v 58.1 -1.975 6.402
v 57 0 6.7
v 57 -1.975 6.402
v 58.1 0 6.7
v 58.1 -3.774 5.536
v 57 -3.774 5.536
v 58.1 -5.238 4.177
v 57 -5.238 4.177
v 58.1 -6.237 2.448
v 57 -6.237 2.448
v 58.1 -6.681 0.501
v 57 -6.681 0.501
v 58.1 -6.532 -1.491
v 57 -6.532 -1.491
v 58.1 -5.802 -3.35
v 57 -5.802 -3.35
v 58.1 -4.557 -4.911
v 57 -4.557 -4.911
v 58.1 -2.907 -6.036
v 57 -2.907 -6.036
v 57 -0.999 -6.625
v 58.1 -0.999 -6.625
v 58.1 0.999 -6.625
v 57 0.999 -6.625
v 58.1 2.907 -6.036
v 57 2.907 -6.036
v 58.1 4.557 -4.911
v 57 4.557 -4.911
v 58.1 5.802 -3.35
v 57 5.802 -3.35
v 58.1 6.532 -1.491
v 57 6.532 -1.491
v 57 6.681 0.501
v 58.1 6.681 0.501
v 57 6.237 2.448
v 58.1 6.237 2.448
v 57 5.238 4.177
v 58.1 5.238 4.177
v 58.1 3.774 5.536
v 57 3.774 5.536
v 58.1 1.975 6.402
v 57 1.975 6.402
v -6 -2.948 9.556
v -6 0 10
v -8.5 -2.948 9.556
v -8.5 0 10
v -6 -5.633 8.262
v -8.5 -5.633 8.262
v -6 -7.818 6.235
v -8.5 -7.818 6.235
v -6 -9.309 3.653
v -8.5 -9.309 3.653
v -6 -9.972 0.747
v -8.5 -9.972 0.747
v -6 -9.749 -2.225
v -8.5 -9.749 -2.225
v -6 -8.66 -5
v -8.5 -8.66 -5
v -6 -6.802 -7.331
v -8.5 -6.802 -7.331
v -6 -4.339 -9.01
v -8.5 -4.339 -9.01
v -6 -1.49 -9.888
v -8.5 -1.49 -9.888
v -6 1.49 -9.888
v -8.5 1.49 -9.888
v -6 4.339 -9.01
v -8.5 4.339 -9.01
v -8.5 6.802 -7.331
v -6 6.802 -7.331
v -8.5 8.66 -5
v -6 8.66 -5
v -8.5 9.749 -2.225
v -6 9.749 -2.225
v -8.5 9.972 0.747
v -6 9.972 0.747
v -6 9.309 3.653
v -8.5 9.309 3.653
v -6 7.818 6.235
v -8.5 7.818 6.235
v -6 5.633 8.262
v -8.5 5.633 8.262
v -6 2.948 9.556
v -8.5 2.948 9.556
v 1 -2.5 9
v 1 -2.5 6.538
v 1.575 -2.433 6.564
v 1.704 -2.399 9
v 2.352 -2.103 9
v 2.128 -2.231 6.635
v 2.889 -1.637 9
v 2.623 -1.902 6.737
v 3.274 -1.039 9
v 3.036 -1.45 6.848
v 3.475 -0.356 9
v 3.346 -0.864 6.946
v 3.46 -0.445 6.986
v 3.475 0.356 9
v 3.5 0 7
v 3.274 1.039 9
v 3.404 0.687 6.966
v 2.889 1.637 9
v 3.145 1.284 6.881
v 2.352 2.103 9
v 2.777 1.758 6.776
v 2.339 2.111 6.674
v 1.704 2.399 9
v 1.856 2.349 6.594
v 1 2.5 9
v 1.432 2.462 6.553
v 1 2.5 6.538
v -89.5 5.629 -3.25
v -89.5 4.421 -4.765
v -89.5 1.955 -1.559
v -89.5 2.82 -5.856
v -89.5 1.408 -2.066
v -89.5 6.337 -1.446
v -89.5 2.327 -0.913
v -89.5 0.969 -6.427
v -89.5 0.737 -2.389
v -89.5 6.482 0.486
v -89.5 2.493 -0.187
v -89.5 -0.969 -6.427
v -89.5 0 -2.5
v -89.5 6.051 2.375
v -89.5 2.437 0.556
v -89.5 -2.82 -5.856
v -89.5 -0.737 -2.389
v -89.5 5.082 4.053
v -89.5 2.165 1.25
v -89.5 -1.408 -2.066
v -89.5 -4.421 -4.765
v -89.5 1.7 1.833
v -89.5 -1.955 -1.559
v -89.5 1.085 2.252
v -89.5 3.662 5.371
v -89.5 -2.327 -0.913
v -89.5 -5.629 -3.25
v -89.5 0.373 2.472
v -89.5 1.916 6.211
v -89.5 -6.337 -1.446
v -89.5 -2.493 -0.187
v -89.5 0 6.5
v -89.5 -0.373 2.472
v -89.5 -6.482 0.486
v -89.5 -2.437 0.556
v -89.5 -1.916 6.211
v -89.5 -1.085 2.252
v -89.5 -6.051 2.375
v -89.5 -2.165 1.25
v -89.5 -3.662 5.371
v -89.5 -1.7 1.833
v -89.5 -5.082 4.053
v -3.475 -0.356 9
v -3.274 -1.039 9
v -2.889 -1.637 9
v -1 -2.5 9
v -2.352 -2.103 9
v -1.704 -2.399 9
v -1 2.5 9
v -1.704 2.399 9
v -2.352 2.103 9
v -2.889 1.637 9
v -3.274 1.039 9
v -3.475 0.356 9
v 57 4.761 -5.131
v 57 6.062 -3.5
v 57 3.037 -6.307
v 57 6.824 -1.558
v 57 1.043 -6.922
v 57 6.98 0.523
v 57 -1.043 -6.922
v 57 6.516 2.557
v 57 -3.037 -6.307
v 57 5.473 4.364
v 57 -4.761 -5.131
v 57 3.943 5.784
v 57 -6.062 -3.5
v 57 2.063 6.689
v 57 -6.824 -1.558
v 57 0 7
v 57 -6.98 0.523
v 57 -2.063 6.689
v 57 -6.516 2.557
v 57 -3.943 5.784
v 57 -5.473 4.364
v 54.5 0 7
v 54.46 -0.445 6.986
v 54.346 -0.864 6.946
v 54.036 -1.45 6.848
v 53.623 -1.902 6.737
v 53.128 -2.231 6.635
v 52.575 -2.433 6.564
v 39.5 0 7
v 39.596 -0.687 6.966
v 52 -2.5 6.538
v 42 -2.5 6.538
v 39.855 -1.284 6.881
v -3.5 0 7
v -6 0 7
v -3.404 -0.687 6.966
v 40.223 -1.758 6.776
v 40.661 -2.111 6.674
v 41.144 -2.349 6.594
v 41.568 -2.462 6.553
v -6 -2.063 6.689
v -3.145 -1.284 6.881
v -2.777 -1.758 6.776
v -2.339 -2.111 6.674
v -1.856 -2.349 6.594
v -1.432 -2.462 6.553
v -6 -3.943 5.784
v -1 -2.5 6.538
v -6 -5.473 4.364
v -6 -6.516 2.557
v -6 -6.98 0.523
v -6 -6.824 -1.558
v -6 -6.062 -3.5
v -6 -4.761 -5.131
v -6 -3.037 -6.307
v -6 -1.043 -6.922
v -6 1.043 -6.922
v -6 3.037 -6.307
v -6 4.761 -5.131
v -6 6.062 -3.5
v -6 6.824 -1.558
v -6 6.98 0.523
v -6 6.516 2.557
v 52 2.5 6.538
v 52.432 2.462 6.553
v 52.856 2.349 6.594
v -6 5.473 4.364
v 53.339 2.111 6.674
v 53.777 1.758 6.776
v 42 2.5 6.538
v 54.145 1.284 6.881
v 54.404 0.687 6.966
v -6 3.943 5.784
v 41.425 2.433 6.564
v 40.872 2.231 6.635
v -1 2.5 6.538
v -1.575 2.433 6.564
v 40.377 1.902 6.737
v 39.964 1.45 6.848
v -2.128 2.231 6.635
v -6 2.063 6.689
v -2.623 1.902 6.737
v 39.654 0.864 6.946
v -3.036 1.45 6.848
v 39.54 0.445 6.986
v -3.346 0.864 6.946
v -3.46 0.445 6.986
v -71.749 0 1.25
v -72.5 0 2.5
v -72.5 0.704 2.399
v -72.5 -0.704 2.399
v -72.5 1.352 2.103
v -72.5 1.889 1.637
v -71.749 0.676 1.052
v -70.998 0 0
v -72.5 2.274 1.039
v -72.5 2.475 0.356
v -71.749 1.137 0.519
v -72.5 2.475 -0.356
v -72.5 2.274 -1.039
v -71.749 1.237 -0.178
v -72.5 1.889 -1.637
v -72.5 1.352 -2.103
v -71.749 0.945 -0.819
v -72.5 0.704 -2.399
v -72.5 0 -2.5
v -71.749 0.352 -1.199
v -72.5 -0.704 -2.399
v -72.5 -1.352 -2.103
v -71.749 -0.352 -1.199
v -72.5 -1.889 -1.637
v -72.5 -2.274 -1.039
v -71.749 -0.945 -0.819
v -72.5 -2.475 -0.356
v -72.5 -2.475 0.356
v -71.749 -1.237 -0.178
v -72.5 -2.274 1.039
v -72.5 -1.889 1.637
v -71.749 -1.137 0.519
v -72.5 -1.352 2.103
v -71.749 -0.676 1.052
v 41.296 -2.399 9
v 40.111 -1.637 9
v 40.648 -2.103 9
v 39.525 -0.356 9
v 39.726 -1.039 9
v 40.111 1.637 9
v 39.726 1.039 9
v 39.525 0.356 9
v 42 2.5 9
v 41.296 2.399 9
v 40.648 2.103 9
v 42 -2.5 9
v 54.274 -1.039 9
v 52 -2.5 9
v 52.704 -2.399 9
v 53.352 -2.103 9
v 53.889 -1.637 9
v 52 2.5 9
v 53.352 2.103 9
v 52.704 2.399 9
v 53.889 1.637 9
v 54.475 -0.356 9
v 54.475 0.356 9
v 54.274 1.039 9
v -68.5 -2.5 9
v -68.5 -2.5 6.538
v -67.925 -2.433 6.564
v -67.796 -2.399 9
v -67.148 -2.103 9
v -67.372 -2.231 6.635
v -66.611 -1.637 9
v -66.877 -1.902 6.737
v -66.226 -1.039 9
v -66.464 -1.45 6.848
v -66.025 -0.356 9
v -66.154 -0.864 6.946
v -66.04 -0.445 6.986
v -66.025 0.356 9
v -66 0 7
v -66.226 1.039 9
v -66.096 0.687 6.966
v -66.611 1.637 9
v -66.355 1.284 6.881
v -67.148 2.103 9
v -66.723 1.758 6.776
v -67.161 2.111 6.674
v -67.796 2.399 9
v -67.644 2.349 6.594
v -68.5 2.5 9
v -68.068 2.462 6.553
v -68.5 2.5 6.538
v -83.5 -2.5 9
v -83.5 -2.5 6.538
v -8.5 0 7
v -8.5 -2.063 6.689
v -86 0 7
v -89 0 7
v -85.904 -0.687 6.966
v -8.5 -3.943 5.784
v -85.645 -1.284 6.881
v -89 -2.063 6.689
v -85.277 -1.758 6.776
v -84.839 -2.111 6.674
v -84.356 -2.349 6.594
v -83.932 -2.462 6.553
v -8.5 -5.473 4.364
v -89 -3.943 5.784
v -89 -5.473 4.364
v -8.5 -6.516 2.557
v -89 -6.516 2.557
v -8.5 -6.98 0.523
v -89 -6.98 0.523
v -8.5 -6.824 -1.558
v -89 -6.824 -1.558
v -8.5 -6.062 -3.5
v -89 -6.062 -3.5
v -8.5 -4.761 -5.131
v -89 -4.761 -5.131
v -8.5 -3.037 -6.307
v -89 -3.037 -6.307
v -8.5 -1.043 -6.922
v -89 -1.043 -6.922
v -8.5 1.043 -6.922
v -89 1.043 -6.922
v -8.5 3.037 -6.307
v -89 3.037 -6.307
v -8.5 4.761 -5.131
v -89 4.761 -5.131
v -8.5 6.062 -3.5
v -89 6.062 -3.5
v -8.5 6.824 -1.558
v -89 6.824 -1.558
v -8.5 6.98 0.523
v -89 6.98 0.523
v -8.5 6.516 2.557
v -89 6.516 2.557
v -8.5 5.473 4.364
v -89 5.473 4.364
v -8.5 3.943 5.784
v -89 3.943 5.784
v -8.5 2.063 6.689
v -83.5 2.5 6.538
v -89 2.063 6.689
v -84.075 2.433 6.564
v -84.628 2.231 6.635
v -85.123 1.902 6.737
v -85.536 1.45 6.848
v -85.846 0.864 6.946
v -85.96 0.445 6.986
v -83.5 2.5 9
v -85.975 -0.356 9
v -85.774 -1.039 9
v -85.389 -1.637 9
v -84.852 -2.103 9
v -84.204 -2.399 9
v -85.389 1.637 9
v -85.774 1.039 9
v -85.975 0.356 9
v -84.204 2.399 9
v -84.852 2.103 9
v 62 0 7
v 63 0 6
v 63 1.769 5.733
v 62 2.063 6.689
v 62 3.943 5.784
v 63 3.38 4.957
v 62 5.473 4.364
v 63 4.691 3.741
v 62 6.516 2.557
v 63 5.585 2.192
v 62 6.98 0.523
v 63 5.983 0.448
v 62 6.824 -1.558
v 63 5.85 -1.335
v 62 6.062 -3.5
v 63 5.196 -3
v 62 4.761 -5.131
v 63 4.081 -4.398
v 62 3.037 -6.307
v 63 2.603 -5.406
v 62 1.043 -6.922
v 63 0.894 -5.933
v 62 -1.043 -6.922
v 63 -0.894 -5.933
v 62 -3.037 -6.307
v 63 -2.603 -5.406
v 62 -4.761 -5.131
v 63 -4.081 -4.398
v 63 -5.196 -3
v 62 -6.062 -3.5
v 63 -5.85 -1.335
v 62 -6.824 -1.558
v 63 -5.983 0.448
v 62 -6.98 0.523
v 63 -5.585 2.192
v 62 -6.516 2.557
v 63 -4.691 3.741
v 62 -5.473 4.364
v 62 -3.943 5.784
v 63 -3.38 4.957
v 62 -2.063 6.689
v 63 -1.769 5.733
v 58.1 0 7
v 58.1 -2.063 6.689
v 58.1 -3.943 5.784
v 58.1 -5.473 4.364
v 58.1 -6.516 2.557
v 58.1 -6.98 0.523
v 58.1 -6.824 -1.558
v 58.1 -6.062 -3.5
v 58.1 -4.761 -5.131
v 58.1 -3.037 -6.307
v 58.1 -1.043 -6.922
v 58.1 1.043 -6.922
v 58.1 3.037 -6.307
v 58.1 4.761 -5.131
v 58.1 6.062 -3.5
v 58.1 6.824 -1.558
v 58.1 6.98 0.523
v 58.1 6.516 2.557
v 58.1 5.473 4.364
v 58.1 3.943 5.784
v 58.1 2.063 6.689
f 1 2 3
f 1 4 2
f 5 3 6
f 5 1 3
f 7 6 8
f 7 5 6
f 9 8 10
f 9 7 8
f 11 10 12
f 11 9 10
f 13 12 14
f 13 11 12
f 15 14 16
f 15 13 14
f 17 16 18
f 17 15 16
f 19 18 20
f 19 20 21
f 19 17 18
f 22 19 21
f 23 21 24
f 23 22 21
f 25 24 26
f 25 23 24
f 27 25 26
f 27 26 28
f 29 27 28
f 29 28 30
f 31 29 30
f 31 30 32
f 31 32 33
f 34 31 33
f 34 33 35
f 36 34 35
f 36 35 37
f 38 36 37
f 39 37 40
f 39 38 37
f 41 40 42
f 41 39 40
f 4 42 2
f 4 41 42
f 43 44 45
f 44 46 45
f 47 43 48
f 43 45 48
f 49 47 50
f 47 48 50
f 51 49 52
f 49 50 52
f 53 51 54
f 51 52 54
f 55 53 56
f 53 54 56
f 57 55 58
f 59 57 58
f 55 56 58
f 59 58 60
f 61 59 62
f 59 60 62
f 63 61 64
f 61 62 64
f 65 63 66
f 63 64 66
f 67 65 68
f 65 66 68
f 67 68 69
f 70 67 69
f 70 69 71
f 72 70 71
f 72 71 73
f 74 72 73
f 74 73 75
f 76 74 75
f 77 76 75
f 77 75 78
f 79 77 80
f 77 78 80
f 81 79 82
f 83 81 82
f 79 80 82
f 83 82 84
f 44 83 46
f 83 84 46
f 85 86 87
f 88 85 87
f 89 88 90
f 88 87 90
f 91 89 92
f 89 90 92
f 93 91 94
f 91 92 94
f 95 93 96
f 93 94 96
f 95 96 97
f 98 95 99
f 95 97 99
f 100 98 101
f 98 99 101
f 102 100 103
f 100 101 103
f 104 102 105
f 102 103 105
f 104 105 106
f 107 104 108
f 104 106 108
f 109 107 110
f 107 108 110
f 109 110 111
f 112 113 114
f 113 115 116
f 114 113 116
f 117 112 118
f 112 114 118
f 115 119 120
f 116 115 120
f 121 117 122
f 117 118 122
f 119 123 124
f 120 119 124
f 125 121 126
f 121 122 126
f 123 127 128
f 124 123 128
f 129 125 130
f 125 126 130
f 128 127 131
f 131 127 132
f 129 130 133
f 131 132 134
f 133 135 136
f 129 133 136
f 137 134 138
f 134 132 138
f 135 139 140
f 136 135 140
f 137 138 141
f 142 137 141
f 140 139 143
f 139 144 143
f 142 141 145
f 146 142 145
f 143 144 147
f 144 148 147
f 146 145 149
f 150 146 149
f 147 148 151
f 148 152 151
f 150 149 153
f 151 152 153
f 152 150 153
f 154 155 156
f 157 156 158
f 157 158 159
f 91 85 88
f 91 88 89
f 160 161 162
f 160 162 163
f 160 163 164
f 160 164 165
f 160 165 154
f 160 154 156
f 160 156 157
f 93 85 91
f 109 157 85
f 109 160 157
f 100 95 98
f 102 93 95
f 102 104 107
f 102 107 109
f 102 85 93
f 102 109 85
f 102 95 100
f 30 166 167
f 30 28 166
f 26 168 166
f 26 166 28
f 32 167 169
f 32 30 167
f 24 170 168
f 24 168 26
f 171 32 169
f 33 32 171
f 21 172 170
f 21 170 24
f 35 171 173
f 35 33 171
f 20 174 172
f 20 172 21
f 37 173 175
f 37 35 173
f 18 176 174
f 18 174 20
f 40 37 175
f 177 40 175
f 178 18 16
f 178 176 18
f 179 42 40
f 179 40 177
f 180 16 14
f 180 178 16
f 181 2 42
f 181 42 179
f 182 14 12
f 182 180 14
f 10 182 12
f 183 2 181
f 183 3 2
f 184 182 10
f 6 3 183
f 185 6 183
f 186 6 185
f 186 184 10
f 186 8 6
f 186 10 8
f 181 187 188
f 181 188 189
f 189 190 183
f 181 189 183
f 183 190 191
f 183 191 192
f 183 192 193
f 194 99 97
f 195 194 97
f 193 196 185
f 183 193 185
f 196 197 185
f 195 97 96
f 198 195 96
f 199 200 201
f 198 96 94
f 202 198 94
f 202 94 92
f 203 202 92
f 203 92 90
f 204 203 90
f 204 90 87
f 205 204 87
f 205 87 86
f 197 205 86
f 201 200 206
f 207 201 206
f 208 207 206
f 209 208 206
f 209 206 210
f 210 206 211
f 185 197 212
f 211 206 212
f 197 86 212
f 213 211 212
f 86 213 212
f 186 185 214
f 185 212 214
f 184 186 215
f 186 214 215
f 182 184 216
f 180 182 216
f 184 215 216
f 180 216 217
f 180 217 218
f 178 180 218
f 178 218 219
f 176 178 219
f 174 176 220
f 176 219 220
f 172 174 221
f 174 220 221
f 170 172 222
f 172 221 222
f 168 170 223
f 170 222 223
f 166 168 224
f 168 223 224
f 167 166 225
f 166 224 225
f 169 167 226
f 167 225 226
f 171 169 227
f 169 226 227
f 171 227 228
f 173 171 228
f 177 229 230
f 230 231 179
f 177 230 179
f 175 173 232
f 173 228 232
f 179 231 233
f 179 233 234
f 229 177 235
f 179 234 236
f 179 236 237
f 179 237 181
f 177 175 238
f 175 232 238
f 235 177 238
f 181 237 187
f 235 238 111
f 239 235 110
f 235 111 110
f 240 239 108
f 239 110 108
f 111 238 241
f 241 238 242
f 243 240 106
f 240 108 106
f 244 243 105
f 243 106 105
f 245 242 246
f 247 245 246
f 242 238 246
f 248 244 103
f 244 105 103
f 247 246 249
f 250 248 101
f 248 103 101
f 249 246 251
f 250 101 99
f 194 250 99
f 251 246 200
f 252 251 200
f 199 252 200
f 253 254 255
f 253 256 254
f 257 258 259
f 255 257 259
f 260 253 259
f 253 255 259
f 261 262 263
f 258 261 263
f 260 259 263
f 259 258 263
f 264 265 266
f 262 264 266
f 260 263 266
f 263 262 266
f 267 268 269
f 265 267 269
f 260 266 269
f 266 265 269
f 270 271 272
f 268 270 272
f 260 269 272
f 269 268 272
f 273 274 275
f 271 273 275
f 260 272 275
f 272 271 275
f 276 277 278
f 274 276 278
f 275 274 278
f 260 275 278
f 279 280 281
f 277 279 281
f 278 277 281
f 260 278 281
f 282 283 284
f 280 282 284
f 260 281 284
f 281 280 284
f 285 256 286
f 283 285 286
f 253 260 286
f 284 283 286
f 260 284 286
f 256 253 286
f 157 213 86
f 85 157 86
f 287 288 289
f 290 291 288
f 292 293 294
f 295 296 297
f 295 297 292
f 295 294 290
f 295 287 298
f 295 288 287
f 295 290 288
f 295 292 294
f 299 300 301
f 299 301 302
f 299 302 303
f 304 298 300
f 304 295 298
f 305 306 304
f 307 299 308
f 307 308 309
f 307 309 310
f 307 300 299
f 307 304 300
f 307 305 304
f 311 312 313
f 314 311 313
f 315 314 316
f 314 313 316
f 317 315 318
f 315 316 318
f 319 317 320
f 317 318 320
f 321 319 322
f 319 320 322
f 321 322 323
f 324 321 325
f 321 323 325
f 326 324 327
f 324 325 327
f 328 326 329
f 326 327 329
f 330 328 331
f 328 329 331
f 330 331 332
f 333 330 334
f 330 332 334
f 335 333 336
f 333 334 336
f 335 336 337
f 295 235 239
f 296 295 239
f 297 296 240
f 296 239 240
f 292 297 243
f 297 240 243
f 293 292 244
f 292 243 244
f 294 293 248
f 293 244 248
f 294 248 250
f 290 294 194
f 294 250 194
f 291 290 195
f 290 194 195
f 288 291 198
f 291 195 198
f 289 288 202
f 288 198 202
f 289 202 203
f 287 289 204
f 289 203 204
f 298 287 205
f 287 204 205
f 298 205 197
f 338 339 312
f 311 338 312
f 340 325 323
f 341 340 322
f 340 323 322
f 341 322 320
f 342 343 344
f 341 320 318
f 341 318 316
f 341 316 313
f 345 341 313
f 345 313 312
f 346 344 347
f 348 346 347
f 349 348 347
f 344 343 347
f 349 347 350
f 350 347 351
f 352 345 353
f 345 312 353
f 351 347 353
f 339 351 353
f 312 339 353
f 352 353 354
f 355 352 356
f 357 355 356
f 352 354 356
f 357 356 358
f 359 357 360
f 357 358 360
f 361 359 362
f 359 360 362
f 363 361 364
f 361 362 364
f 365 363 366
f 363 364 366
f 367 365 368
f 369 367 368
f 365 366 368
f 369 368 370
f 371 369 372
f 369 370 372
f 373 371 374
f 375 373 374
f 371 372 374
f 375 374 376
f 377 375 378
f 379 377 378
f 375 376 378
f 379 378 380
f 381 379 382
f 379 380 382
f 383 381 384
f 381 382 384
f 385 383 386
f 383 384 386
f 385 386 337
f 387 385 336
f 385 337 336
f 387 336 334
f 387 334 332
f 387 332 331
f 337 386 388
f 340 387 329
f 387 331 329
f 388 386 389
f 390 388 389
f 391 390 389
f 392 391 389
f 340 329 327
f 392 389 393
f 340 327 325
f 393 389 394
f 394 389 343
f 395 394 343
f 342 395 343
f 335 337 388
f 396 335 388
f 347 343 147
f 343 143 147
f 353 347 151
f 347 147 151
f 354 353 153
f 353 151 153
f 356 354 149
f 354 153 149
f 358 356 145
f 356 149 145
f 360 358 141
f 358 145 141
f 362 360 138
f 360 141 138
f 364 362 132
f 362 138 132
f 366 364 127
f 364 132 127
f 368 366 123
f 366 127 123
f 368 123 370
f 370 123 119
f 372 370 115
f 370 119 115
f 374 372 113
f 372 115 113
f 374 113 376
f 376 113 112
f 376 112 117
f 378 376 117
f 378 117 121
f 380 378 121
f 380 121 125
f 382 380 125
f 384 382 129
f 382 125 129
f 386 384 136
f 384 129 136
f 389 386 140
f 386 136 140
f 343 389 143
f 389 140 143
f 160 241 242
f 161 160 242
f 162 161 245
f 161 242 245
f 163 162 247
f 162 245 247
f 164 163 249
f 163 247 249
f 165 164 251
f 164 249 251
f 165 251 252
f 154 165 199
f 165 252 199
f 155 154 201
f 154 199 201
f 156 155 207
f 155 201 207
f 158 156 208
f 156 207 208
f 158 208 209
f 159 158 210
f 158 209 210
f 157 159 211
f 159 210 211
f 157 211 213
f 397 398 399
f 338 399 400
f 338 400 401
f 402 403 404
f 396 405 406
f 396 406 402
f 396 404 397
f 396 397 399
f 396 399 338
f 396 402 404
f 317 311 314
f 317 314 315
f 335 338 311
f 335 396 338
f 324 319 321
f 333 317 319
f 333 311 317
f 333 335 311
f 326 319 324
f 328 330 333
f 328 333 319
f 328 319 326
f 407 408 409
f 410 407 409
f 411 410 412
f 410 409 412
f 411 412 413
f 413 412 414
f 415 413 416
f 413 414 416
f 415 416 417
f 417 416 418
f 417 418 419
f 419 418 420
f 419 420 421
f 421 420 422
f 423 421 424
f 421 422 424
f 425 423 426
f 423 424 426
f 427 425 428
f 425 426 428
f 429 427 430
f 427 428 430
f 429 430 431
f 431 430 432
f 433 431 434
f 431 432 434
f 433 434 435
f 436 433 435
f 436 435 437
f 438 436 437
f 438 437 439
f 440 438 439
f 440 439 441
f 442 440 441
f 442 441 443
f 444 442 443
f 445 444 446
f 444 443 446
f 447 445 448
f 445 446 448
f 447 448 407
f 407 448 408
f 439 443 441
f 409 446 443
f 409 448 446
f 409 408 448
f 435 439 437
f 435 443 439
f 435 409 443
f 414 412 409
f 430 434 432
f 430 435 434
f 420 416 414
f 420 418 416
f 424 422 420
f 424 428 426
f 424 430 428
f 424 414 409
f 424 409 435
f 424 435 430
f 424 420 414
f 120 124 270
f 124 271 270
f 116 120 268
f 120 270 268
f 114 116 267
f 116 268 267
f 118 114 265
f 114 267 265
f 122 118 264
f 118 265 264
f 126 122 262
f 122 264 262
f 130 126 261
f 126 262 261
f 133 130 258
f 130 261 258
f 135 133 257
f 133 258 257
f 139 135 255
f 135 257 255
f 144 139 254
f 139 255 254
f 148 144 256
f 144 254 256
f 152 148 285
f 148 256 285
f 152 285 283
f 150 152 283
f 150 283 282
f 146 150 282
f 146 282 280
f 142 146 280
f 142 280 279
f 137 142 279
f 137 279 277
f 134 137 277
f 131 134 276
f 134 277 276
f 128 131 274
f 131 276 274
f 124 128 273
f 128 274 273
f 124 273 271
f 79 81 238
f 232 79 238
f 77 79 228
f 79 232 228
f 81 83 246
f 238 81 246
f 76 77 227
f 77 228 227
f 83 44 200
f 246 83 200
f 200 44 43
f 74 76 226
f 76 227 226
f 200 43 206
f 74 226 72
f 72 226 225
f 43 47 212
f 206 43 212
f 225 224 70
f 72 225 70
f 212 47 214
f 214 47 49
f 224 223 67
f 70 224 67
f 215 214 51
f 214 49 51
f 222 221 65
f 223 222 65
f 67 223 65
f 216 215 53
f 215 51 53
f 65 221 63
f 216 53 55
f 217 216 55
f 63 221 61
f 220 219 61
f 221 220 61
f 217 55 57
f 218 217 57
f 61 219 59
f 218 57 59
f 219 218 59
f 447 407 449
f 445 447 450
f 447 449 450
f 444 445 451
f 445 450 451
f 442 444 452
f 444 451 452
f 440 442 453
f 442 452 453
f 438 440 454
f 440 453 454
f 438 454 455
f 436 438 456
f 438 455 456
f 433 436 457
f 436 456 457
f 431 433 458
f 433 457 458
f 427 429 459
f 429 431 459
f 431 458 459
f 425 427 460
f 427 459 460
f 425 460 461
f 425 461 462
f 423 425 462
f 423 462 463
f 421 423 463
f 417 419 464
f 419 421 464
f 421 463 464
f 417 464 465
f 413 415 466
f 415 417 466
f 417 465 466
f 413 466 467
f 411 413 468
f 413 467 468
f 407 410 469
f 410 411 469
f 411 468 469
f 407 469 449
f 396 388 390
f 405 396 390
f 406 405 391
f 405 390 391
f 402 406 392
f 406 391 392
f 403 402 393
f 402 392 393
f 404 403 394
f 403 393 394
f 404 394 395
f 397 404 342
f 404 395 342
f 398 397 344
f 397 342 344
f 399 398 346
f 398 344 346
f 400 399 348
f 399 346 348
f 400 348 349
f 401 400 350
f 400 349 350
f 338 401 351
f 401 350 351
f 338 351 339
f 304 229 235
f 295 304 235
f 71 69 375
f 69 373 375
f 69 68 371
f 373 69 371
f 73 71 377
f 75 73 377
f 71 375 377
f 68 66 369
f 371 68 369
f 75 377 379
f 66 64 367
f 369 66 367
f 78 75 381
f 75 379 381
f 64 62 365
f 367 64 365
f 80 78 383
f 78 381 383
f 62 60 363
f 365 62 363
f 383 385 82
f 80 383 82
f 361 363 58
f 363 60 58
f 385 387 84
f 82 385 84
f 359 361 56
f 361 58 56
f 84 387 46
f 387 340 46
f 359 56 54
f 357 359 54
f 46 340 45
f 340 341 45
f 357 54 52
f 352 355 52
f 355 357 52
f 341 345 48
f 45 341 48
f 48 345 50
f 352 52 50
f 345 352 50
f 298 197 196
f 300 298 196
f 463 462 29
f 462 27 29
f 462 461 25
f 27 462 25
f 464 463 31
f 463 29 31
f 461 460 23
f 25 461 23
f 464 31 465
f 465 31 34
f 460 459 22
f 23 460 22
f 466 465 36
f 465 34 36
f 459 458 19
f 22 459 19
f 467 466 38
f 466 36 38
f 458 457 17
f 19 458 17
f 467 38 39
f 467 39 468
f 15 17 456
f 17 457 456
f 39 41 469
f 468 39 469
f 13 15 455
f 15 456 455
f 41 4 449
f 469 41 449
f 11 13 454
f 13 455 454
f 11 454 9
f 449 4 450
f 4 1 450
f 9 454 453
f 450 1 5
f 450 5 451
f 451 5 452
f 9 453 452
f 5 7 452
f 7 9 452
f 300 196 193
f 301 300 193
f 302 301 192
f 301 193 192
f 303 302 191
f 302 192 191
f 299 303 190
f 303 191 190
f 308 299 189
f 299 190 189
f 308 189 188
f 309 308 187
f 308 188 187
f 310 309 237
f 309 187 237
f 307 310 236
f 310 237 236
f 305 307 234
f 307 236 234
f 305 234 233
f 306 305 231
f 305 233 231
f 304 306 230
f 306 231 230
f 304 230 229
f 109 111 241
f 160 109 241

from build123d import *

# Parameters (mm, degrees)
EXTRUDE_1_DEPTH        = 9
SKETCH_3_R             = 15
CUT_EXTRUDE_1_DEPTH    = 26.5
HOLE_WIZARD_M6_1_D     = 5
HOLE_WIZARD_M6_1_DEPTH = 17
HOLE_WIZARD_M6_1_TIP   = 1.502151548
CHAMFER_1_SIZE         = 1
SKETCH_6_W             = 1.1
SKETCH_6_H             = 0.3


with BuildPart() as part:
    # 草图1 → 旋转1 (revolve)
    with BuildSketch(Plane.XY, mode=Mode.PRIVATE) as revolve_1_sk:
        Polygon((-89.5, 0), (89.5, 0), (89.5, 6), (88.5, 7), (-6, 7), (-6, 10), (-8.5, 10), (-8.5, 7), (-89, 7), (-89.5, 6.5), align=None)
    revolve(revolve_1_sk.sketch.rotate(Axis((-89.5, 0, 0), (1, 0, 0)), 90), axis=Axis((-89.5, 0, 0), (1, 0, 0)))

    # 草图2 → 凸台-拉伸1 (add)
    with BuildSketch(Plane.XY):
        with BuildLine():
            Line((68.5, -2.5), (83.5, -2.5))
            ThreePointArc((83.5, -2.5), (86, 0), (83.5, 2.5))
            Line((83.5, 2.5), (68.5, 2.5))
            ThreePointArc((68.5, 2.5), (66, 0), (68.5, -2.5))
        make_face()
        with BuildLine():
            ThreePointArc((-83.5, 2.5), (-86, 0), (-83.5, -2.5))
            Line((-83.5, -2.5), (-68.5, -2.5))
            ThreePointArc((-68.5, -2.5), (-66, 0), (-68.5, 2.5))
            Line((-68.5, 2.5), (-83.5, 2.5))
        make_face()
        with BuildLine():
            Line((1, 2.5), (-1, 2.5))
            ThreePointArc((-1, 2.5), (-3.5, 0), (-1, -2.5))
            Line((-1, -2.5), (1, -2.5))
            ThreePointArc((1, -2.5), (3.5, 0), (1, 2.5))
        make_face()
        with BuildLine():
            Line((52, 2.5), (42, 2.5))
            ThreePointArc((42, 2.5), (39.5, 0), (42, -2.5))
            Line((42, -2.5), (52, -2.5))
            ThreePointArc((52, -2.5), (54.5, 0), (52, 2.5))
        make_face()
    extrude(amount=EXTRUDE_1_DEPTH)

    # 草图3 → 切除-拉伸1 (cut)
    with BuildSketch(Plane(origin=(89.5, 0, 0), x_dir=(0, 0, -1), z_dir=(1, 0, 0))):
        Circle(SKETCH_3_R)
    extrude(amount=-CUT_EXTRUDE_1_DEPTH, mode=Mode.SUBTRACT)

    # M6 螺纹孔1
    with Locations(Plane.ZY.offset(89.5)):
        with Locations((0, 0)):
            Hole(HOLE_WIZARD_M6_1_D / 2, depth=HOLE_WIZARD_M6_1_DEPTH)
            with Locations((0, 0, -(HOLE_WIZARD_M6_1_DEPTH + HOLE_WIZARD_M6_1_TIP / 2))):  # 118° drill point
                Cone(0, HOLE_WIZARD_M6_1_D / 2, HOLE_WIZARD_M6_1_TIP, mode=Mode.SUBTRACT)

    # 倒角1
    chamfer_1_edges = [part.edges().sort_by_distance(p)[0] for p in [
        (63, 0, -7),
    ]]
    chamfer(chamfer_1_edges, length=CHAMFER_1_SIZE)

    # 草图6 → 切除-旋转1 (revolve, cut)
    with BuildSketch(Plane.XY, mode=Mode.PRIVATE) as cut_revolve_1_sk:
        with Locations((57.55, -6.85)):
            Rectangle(SKETCH_6_W, SKETCH_6_H)
    revolve(cut_revolve_1_sk.sketch.rotate(Axis((0, 0, 0), (1, 0, 0)), 270), axis=Axis((0, 0, 0), (1, 0, 0)), mode=Mode.SUBTRACT)


solid = part.part
